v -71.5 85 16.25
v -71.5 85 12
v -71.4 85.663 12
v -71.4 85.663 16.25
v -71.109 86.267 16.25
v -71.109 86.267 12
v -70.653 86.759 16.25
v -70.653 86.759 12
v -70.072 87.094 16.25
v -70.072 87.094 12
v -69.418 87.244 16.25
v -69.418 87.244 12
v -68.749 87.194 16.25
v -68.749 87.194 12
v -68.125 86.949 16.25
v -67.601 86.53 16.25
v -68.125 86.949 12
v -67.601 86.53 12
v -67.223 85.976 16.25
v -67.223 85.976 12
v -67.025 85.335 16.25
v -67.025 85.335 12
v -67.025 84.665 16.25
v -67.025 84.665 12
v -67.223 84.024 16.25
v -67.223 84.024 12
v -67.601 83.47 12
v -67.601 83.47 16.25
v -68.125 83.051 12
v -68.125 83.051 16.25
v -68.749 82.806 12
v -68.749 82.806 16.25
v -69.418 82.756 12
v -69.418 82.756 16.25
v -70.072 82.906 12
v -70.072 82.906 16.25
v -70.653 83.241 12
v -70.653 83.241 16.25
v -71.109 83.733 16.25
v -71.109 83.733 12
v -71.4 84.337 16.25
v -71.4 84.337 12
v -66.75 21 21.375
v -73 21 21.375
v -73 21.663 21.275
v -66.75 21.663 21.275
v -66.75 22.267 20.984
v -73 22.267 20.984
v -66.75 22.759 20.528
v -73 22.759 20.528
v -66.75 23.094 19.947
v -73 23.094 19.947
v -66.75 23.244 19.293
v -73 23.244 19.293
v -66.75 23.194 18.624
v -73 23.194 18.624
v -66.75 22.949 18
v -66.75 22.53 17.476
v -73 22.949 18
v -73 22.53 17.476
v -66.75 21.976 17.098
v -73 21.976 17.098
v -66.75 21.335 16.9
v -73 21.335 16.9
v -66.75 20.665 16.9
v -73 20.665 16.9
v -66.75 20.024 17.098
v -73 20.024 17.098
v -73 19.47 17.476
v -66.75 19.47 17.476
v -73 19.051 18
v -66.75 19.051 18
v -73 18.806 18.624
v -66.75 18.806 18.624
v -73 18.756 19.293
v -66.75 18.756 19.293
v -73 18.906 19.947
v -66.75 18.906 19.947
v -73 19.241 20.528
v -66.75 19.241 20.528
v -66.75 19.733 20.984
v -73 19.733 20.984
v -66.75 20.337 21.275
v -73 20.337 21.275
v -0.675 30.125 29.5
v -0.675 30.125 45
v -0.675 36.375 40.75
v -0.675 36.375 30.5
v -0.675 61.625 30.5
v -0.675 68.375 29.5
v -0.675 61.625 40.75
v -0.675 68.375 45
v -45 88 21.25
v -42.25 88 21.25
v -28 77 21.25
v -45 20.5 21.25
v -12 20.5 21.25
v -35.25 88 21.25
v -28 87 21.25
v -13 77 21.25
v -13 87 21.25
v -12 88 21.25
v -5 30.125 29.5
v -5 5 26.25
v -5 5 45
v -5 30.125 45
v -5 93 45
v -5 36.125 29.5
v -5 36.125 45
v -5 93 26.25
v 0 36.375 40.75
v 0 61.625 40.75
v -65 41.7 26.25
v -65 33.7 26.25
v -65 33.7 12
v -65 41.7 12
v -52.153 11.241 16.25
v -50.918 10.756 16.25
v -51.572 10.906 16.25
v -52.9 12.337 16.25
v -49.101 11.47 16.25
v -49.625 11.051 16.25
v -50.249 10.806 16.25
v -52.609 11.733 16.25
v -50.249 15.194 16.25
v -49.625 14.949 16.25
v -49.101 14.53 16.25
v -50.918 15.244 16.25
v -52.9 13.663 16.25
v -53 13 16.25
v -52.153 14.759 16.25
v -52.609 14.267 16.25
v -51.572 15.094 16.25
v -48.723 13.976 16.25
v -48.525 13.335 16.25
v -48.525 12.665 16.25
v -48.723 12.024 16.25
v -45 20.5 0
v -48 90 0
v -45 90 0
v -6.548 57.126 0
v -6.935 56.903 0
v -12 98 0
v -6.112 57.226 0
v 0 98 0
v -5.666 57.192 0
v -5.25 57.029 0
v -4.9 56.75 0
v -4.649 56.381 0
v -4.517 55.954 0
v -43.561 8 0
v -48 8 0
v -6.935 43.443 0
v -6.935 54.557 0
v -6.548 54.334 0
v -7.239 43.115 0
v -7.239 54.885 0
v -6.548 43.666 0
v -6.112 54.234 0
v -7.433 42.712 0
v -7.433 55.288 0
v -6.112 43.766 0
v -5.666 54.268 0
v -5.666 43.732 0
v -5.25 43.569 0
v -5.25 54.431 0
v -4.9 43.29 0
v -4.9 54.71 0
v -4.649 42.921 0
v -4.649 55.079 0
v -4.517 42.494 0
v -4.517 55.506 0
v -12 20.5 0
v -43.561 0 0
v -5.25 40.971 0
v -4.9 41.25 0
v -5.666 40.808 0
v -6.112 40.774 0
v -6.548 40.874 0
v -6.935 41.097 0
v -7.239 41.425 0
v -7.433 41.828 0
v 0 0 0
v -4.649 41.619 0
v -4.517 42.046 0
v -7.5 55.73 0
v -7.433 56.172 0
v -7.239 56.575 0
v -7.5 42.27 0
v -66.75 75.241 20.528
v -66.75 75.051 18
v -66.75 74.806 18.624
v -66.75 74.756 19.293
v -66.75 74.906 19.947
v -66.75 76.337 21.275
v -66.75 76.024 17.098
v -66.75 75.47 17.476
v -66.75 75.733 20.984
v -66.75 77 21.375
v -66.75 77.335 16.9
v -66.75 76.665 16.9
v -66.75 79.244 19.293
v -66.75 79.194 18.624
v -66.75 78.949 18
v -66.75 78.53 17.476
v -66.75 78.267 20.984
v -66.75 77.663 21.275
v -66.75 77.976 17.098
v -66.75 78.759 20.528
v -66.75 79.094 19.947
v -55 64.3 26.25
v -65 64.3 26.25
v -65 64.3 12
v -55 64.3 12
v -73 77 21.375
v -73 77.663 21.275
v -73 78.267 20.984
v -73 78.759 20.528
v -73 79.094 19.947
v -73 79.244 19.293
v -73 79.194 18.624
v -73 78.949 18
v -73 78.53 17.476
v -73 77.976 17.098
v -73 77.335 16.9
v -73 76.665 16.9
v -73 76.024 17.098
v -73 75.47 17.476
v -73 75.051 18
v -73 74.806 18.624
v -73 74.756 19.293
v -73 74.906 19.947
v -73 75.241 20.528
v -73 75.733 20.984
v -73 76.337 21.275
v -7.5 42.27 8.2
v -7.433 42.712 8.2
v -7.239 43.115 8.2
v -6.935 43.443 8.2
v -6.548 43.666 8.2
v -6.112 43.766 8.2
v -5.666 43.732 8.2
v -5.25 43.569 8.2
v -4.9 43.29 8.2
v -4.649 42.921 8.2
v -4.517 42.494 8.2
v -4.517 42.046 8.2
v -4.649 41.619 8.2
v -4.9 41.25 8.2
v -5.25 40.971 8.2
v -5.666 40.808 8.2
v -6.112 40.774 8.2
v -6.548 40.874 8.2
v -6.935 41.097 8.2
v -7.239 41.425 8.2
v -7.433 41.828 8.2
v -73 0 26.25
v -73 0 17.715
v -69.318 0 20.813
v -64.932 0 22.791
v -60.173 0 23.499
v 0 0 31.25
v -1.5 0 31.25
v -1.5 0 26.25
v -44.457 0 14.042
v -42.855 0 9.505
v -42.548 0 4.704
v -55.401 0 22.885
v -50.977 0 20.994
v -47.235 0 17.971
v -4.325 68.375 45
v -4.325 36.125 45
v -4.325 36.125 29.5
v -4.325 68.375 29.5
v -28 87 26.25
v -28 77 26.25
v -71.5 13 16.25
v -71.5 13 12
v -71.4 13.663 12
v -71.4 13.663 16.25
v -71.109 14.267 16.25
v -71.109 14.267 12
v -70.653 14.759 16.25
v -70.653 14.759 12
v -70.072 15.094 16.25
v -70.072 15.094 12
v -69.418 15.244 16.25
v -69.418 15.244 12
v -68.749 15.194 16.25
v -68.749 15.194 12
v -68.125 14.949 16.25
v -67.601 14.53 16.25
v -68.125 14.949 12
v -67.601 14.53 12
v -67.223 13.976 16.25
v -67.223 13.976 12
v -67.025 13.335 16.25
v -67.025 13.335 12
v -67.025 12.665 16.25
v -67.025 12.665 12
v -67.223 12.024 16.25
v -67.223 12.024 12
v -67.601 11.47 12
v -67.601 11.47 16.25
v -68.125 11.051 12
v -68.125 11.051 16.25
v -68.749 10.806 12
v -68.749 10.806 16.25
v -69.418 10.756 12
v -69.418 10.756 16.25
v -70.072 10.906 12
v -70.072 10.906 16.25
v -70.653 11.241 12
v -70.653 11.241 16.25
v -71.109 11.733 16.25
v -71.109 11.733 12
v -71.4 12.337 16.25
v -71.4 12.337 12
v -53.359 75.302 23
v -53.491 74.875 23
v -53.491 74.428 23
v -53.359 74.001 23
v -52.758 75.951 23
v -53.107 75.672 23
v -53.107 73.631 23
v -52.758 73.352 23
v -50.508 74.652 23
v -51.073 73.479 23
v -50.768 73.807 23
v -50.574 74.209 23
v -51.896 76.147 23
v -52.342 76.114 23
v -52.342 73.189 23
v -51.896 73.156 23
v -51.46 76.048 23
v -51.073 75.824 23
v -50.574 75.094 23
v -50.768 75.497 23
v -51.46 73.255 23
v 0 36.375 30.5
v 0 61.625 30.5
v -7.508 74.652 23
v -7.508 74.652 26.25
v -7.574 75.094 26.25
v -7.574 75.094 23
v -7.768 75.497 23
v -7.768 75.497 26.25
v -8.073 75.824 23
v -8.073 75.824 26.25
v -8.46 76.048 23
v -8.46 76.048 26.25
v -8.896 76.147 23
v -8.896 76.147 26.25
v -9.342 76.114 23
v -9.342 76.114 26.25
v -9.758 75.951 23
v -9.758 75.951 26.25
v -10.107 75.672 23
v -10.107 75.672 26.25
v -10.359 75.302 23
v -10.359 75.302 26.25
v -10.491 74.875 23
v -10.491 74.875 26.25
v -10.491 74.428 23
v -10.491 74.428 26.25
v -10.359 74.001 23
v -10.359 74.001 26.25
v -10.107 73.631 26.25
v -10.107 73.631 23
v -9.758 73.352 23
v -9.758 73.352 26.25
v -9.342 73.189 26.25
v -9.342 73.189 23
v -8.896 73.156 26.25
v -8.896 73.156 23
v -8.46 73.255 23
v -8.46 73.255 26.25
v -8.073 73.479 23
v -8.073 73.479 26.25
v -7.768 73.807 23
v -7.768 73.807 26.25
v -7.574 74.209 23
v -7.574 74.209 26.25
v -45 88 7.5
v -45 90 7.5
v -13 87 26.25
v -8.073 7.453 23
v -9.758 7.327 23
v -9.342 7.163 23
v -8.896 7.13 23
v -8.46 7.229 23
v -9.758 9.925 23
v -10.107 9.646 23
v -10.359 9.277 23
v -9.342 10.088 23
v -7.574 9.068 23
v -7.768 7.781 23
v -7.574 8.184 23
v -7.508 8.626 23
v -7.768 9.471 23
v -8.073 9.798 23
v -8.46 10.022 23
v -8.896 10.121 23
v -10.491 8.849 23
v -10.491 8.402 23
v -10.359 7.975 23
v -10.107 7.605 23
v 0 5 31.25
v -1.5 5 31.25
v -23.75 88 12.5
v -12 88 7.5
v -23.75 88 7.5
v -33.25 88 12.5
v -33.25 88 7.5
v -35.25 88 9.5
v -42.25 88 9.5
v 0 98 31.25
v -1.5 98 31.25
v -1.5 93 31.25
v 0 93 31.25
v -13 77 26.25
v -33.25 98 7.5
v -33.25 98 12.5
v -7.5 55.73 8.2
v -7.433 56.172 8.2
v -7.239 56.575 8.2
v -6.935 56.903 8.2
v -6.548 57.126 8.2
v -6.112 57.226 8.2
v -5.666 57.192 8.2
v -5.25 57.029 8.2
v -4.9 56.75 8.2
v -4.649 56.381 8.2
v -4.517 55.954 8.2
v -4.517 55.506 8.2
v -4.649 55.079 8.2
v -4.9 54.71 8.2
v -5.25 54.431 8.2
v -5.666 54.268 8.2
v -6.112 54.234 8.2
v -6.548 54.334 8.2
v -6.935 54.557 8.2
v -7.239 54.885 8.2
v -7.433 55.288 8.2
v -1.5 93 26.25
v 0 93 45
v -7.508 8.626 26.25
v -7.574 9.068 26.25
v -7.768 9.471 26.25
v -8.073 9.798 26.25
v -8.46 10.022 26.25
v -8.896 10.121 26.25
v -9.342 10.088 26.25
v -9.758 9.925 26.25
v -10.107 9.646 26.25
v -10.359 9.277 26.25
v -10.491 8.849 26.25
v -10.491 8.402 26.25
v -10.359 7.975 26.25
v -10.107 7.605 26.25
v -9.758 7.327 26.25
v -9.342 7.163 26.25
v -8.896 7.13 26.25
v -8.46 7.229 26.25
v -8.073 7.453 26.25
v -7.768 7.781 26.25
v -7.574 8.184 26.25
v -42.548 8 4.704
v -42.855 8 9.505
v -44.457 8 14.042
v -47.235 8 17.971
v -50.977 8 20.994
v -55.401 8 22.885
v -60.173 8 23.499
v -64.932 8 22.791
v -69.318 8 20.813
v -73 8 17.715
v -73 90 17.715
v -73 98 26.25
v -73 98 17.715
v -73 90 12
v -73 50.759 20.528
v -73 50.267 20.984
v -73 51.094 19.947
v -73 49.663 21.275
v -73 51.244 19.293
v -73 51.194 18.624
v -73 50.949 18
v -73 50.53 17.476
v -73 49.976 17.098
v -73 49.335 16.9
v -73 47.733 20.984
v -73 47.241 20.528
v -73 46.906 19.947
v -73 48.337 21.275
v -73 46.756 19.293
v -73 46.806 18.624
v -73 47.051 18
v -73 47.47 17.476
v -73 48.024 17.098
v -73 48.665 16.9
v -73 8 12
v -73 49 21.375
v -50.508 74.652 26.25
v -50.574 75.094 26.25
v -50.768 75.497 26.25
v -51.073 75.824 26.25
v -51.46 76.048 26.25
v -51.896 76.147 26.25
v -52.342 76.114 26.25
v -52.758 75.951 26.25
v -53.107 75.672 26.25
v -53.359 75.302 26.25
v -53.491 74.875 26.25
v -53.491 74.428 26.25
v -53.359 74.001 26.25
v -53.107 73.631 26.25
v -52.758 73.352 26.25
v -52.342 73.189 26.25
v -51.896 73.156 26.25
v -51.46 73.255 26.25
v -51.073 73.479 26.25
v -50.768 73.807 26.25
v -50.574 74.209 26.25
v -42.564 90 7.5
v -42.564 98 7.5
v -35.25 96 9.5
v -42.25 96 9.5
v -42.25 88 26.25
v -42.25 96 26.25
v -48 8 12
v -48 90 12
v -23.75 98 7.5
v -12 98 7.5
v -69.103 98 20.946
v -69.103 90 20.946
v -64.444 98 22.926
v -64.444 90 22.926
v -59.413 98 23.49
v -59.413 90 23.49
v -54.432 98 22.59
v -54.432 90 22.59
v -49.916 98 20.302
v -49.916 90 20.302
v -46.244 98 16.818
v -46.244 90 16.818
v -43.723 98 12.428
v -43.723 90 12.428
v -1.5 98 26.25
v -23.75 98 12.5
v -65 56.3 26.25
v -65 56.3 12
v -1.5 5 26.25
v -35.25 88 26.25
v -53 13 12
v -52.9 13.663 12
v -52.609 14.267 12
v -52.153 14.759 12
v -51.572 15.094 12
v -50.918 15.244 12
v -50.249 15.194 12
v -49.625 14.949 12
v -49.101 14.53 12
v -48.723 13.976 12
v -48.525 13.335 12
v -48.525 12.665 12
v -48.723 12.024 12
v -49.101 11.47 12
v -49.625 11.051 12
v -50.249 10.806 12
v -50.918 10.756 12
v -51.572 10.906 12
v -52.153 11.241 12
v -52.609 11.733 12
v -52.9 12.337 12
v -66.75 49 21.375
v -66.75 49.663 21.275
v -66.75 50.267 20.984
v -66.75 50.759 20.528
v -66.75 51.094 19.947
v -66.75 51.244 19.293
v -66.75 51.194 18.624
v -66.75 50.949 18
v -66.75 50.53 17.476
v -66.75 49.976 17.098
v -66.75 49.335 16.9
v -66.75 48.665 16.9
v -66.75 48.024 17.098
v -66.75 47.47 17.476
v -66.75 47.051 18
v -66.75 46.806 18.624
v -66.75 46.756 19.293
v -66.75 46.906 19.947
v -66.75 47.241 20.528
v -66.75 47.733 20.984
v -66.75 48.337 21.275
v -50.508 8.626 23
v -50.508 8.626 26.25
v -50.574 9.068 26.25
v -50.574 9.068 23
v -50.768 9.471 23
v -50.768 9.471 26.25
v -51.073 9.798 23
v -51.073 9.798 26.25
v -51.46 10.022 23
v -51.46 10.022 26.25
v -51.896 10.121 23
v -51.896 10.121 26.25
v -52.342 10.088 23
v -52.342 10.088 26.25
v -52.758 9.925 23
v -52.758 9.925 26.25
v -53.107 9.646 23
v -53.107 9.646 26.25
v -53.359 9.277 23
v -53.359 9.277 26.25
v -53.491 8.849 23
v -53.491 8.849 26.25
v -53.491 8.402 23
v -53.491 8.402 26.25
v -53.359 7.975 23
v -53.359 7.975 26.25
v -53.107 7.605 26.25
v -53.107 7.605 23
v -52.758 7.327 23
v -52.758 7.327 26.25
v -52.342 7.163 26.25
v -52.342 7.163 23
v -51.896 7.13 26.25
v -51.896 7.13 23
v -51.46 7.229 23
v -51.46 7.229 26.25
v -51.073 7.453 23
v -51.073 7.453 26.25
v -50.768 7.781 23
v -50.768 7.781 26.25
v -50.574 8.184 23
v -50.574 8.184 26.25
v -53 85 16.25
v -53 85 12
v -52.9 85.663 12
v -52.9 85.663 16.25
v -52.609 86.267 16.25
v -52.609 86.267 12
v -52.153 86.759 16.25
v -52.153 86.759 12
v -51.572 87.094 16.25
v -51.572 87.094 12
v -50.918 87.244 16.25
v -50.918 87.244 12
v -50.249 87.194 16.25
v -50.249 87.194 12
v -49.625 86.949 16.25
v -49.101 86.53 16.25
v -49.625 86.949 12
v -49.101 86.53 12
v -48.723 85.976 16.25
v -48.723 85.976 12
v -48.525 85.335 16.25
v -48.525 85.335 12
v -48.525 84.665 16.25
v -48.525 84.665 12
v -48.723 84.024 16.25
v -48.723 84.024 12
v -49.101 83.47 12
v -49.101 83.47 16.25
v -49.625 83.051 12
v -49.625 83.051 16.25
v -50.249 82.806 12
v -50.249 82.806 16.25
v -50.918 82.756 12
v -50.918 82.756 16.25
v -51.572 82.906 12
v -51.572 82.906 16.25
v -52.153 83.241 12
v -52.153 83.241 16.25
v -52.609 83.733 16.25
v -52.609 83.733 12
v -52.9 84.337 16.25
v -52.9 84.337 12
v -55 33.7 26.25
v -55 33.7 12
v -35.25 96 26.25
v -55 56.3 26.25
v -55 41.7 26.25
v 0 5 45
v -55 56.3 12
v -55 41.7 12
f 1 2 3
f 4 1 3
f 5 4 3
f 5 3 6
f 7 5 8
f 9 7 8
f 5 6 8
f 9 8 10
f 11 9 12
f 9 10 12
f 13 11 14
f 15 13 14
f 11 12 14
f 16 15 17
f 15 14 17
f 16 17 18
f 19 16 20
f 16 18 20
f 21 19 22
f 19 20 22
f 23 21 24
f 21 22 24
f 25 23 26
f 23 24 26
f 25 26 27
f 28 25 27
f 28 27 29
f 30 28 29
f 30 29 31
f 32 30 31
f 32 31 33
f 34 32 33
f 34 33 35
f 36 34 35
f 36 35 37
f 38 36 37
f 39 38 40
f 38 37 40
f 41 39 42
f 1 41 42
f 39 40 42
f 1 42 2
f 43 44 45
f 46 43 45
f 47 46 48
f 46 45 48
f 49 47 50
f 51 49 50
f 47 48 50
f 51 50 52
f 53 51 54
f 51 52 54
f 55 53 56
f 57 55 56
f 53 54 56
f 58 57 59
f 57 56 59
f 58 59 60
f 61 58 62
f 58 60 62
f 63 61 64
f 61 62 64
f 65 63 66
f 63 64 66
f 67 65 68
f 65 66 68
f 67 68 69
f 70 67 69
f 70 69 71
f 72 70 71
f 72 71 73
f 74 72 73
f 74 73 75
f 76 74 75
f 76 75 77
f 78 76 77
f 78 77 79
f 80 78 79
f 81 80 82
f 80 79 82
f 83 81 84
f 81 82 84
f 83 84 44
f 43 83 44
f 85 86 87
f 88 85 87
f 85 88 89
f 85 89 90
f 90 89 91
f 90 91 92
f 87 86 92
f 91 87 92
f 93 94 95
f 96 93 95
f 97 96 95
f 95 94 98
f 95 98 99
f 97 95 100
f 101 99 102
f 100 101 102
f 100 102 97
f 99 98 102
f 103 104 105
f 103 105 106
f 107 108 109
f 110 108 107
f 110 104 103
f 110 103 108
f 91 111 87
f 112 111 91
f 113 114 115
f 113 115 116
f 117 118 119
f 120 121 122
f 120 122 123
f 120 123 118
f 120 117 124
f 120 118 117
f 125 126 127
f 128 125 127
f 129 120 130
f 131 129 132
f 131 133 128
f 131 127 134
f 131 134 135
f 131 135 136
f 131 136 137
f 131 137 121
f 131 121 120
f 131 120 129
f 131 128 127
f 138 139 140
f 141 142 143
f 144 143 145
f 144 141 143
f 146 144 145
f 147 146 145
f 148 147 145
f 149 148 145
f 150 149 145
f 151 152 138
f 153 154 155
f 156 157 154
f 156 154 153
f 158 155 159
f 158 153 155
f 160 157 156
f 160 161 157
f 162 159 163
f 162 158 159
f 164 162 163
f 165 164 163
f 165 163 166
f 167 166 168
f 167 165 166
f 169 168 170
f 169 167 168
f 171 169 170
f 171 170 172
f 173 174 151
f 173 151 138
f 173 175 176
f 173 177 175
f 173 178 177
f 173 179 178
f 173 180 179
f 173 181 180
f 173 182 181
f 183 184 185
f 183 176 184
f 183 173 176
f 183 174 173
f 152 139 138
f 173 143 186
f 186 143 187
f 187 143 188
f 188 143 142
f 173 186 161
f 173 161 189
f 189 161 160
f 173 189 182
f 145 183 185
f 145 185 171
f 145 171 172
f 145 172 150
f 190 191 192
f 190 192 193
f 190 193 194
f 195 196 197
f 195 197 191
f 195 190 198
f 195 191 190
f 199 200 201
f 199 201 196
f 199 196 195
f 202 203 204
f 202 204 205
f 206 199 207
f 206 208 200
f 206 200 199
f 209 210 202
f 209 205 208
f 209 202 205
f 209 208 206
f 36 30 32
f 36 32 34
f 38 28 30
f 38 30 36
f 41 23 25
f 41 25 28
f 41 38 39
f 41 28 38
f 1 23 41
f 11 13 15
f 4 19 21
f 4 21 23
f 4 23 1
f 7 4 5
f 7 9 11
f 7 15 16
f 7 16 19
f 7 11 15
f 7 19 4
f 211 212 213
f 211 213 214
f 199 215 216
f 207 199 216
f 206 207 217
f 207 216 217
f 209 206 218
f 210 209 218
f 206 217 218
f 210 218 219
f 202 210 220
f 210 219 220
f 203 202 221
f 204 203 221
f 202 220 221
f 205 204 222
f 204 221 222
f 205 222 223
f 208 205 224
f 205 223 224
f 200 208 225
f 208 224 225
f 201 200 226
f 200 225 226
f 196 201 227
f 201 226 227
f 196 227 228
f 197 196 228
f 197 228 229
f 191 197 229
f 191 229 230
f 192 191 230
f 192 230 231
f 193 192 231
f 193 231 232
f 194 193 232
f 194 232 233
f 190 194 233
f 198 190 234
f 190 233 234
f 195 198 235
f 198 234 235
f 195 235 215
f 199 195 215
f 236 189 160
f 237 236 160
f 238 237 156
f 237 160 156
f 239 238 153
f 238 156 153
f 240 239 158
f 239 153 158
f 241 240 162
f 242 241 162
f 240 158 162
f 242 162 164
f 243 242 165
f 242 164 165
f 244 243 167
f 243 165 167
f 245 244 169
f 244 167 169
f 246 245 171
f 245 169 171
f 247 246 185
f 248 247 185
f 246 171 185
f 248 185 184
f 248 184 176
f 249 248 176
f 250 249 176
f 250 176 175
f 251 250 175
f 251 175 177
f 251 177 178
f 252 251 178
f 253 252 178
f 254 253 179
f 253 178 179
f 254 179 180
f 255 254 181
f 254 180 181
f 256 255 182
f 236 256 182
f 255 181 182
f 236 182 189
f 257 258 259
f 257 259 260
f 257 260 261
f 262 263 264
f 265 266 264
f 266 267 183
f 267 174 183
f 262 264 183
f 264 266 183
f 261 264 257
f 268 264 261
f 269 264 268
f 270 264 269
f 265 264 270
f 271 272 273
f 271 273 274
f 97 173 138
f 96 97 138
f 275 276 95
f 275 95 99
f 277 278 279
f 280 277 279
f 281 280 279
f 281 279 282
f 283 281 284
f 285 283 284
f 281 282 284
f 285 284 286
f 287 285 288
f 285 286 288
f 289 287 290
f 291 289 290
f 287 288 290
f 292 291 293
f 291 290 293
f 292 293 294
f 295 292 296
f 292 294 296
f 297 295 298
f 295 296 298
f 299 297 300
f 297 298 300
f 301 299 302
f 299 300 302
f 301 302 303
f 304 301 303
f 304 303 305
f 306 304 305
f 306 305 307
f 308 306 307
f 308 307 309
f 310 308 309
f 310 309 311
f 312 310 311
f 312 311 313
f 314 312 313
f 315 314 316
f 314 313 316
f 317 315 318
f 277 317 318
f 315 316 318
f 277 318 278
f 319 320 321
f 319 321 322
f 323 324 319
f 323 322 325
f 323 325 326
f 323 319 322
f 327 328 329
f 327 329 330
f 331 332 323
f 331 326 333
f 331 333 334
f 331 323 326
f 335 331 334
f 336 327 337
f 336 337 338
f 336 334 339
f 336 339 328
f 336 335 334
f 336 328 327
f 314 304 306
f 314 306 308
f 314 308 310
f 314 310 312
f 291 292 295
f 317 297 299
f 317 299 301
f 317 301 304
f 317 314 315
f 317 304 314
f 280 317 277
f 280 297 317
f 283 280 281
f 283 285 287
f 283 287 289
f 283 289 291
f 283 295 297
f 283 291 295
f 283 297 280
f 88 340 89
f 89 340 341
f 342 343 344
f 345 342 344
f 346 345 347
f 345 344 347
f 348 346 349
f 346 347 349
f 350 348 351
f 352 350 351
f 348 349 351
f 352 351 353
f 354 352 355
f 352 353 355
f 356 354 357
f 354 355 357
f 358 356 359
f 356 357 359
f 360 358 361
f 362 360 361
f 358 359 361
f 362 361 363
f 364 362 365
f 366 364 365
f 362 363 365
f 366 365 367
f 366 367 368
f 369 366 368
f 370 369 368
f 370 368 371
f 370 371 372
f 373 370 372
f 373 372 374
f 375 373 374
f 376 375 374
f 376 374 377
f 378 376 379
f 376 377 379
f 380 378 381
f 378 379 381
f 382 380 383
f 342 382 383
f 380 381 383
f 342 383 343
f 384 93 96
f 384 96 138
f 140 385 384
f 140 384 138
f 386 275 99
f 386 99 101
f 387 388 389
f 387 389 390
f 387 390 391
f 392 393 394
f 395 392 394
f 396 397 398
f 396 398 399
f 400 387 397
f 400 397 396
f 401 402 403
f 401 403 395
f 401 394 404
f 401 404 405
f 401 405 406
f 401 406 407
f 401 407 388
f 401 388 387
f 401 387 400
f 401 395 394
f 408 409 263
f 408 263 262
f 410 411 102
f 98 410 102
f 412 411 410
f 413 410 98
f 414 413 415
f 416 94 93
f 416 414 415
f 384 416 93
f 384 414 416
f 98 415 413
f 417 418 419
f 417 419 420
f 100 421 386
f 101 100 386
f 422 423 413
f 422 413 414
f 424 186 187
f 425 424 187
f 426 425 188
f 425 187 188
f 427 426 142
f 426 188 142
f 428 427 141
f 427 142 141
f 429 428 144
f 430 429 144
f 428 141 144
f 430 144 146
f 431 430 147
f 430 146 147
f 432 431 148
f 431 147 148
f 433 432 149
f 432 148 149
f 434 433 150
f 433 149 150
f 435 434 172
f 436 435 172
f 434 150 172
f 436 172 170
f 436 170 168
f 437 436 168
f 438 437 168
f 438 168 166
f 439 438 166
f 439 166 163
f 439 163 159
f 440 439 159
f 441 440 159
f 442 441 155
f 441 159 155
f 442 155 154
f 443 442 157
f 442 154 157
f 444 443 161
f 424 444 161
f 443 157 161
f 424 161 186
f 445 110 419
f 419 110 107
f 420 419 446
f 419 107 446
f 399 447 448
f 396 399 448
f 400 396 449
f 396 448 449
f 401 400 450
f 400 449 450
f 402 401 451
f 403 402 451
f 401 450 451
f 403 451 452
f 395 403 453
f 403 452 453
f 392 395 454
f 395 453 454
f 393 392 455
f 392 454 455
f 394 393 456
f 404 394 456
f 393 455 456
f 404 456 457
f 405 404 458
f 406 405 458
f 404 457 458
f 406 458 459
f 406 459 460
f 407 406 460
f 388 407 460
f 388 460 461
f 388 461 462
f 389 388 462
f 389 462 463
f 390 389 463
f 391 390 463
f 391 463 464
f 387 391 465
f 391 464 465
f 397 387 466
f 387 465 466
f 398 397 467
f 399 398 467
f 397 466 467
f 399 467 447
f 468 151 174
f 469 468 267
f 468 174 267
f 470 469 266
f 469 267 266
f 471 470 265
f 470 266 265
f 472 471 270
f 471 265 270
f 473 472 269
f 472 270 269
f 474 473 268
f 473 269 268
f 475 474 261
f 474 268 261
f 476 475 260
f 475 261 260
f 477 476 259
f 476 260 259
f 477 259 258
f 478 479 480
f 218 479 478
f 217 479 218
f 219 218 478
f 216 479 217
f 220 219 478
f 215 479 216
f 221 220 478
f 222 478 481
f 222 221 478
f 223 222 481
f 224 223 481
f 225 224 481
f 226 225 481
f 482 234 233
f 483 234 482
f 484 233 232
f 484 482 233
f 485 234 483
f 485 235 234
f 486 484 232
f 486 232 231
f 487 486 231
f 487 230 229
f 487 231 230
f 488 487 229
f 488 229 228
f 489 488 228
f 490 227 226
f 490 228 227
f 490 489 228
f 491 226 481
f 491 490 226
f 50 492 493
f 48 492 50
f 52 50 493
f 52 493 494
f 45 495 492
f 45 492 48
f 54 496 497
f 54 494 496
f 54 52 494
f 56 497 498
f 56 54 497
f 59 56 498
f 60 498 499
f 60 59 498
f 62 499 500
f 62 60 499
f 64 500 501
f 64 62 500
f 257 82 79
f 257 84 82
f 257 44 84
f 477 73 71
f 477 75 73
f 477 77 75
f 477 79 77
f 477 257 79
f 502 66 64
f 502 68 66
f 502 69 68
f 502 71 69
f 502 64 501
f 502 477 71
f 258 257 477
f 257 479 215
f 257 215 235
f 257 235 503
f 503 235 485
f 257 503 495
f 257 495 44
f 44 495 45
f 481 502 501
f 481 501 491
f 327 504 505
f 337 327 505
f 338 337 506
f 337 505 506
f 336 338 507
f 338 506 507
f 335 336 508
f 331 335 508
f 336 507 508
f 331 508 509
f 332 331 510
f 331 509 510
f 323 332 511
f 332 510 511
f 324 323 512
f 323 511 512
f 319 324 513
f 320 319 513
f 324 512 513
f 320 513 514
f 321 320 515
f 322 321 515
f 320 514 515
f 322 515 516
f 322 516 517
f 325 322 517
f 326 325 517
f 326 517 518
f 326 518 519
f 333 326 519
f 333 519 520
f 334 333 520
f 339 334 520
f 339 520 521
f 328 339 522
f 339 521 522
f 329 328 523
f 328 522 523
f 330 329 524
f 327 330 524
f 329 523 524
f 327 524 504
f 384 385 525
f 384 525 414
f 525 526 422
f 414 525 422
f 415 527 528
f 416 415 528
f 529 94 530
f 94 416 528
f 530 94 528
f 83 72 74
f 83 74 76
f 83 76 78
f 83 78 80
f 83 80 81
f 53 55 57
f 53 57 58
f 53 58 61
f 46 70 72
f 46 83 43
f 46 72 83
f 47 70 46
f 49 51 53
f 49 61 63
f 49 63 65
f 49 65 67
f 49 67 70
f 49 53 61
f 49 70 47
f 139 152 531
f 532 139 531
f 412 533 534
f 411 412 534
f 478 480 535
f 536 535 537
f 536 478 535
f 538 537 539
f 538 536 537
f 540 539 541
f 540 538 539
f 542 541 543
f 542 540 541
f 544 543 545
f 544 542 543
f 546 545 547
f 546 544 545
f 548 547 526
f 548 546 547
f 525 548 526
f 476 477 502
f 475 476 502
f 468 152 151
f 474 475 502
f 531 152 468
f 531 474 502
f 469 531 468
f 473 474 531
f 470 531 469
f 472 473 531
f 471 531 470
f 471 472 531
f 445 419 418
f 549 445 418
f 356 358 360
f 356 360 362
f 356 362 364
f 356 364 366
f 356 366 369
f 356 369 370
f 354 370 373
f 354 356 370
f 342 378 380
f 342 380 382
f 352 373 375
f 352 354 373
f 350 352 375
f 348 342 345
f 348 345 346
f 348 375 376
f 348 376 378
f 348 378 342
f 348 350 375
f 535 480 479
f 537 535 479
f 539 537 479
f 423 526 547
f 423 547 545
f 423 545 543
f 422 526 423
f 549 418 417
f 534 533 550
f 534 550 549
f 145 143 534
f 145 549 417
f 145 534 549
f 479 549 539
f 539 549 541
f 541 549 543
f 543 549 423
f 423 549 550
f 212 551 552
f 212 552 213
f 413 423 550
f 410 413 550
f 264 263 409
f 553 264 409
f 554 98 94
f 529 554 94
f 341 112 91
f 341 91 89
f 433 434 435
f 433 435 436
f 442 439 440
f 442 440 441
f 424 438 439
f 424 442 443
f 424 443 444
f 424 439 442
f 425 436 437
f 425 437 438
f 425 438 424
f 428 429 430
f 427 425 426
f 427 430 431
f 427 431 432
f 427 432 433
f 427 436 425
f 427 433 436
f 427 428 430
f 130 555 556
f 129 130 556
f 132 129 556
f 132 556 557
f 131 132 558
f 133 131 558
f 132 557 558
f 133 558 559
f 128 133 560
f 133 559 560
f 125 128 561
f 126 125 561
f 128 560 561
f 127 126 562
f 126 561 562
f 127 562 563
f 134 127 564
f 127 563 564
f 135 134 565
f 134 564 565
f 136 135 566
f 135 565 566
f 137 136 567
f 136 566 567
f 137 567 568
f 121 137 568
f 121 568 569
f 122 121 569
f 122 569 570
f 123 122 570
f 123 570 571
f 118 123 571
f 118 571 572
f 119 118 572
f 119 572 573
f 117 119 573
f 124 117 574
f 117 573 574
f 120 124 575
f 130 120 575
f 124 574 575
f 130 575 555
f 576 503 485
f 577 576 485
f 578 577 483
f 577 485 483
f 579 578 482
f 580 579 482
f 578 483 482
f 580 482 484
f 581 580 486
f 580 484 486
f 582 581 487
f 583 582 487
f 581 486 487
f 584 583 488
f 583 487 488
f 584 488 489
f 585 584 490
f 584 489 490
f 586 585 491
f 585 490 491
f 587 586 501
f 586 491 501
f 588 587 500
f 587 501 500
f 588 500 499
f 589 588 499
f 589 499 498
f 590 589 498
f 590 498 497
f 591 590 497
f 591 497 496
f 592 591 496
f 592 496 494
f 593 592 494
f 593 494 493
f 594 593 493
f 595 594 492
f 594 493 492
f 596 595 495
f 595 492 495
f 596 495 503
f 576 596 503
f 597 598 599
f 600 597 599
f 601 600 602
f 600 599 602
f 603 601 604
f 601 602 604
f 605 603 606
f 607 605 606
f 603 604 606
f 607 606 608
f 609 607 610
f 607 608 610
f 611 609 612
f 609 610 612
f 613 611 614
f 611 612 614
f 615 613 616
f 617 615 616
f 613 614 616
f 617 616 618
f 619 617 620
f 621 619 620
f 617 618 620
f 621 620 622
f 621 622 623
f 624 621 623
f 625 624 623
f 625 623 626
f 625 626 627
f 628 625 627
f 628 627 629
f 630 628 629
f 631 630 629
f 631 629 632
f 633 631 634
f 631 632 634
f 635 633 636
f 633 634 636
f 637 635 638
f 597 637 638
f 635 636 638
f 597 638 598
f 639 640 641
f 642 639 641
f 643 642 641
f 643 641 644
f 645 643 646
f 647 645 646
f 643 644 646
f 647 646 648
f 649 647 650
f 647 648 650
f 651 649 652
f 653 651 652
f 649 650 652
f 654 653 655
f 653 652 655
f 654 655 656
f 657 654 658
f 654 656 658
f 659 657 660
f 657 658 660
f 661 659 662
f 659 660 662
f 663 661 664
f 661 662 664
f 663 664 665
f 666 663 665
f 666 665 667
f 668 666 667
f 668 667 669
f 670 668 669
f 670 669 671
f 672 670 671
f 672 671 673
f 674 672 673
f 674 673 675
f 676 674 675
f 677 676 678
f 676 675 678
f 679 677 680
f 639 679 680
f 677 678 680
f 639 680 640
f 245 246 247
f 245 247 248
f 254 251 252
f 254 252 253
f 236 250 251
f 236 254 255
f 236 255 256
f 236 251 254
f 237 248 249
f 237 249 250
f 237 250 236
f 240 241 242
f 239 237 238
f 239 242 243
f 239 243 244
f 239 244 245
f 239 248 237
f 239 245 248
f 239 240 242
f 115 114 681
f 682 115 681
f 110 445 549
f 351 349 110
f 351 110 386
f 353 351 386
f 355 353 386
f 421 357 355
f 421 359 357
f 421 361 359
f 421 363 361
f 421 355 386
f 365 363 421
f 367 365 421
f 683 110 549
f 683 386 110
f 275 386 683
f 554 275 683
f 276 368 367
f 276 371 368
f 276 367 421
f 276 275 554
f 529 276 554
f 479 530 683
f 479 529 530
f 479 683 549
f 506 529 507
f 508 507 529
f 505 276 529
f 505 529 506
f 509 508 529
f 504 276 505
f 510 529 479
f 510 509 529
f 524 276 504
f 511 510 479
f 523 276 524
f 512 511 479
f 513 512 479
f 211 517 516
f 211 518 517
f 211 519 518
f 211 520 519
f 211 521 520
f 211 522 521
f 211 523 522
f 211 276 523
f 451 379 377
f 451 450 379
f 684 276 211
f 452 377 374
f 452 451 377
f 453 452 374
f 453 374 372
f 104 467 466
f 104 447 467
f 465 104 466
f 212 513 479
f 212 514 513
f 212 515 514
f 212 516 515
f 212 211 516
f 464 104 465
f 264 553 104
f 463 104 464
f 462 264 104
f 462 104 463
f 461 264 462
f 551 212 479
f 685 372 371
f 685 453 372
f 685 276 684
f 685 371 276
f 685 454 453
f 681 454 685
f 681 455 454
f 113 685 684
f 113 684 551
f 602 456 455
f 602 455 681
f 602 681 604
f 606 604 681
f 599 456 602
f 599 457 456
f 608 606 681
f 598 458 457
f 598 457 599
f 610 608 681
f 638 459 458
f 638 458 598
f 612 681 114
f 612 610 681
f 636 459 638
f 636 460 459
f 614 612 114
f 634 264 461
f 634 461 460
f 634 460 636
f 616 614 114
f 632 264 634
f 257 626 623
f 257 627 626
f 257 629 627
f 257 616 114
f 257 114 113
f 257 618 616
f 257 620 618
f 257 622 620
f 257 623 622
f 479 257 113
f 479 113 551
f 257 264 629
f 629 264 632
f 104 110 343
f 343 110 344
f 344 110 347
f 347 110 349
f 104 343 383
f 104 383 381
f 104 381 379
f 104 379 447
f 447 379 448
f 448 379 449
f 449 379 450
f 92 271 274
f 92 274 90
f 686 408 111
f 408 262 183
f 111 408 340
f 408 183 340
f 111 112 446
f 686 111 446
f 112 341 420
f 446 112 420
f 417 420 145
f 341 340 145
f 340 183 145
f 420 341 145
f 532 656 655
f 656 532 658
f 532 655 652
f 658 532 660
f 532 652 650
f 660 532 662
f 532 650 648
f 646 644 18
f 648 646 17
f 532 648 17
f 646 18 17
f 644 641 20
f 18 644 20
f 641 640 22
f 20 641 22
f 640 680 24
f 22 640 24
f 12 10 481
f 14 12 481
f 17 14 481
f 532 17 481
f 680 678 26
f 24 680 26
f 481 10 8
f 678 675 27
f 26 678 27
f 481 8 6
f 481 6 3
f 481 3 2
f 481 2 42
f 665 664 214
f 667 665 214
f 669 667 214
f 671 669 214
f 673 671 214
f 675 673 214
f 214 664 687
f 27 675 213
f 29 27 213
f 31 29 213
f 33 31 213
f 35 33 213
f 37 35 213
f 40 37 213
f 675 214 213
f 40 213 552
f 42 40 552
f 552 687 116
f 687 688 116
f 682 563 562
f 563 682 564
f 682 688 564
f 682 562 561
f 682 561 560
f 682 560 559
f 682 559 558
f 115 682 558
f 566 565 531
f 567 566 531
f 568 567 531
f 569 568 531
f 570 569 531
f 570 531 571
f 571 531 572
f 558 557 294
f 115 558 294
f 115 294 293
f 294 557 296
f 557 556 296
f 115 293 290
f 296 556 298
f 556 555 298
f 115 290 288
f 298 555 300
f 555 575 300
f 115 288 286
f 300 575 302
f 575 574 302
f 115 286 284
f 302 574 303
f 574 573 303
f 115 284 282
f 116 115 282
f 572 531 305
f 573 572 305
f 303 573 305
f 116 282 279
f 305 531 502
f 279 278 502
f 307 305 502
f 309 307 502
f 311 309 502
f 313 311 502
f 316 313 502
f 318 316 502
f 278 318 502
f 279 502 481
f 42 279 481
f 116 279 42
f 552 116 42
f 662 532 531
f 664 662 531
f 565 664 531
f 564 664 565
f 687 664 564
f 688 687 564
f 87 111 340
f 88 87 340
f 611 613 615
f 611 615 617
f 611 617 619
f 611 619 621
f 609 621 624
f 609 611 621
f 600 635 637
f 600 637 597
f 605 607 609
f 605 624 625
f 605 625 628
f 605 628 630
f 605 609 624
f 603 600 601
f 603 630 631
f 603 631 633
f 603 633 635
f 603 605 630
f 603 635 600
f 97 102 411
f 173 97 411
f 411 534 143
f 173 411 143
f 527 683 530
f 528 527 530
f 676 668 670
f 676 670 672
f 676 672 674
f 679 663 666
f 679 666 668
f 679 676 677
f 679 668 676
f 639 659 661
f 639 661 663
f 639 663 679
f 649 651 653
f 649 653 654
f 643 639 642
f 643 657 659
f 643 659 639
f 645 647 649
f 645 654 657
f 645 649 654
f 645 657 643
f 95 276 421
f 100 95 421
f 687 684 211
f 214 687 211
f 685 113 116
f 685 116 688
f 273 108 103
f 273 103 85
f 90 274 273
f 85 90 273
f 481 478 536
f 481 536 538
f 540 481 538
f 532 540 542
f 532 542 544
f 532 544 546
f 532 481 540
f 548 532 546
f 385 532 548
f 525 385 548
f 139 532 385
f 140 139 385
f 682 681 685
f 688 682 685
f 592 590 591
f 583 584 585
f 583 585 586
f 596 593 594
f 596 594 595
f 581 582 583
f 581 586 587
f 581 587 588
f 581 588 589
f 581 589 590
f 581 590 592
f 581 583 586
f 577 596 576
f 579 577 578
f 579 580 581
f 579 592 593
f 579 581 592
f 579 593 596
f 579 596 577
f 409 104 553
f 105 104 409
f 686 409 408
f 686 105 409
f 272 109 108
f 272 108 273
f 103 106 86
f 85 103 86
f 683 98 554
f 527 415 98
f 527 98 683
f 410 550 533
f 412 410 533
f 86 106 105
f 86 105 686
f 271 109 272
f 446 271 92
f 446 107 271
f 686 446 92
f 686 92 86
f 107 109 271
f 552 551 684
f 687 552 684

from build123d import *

# Parameters (mm, degrees)
SKETCH1_W           = 72
SKETCH1_H           = 26.25
BOSS_EXTRUDE1_DEPTH = 98
SKETCH3_W           = 24
SKETCH3_H           = 12
CUT_EXTRUDE2_DEPTH  = 98
SKETCH4_W           = 1
SKETCH4_H           = 14.25
BOSS_EXTRUDE2_DEPTH = 98
SKETCH8_R           = 17.5
CUT_EXTRUDE6_DEPTH  = 8
CUT_EXTRUDE7_START  = -8
SKETCH9_R           = 17.5
CUT_EXTRUDE7_DEPTH  = 8
SKETCH10_R          = 2.25
CUT_EXTRUDE8_DEPTH  = 4.25
SKETCH11_W          = 33
SKETCH11_H          = 67.5
CUT_EXTRUDE9_DEPTH  = 21.25
SKETCH12_W          = 33
SKETCH12_H          = 7.5
CUT_EXTRUDE10_DEPTH = 21.25
SKETCH13_W          = 9.5
SKETCH13_H          = 10
CUT_EXTRUDE11_DEPTH = 21.25
SKETCH14_W          = 5
SKETCH14_H          = 5
CUT_EXTRUDE13_DEPTH = 101.25
SKETCH17_W          = 7
SKETCH17_H          = 8
CUT_EXTRUDE14_DEPTH = 7
SKETCH18_W          = 5.398243629
SKETCH18_H          = 5.439982626
BOSS_EXTRUDE3_DEPTH = 2
SKETCH19_W          = 15
SKETCH19_H          = 15
CUT_EXTRUDE15_DEPTH = 12
SKETCH20_W          = 15.253773686
SKETCH20_H          = 5.298590198
BOSS_EXTRUDE5_DEPTH = 5
SKETCH22_R          = 1.5
CUT_EXTRUDE16_DEPTH = 8.2
SKETCH23_W          = 10
SKETCH23_H          = 8
CUT_EXTRUDE18_DEPTH = 125.988249448
SKETCH25_R          = 2.25
CUT_EXTRUDE20_DEPTH = 6.25
SKETCH26_W          = 7
SKETCH26_H          = 8
CUT_EXTRUDE21_DEPTH = 124.057913195
SKETCH28_W          = 7.366793482
SKETCH28_H          = 8.135980894
BOSS_EXTRUDE6_DEPTH = 2
SKETCH31_R          = 1.5
CUT_EXTRUDE24_DEPTH = 3.25
SKETCH32_W          = 5
SKETCH32_H          = 98
BOSS_EXTRUDE7_DEPTH = 18.75
SKETCH34_W          = 5
SKETCH34_H          = 5
CUT_EXTRUDE27_DEPTH = 13.75
SKETCH35_W          = 3.5
SKETCH35_H          = 5
CUT_EXTRUDE28_DEPTH = 5
SKETCH37_W          = 10.25
SKETCH37_H          = 25.25
CUT_EXTRUDE29_DEPTH = 3
SKETCH36_W          = 3.65
SKETCH36_H          = 38.25
CUT_EXTRUDE30_DEPTH = 15.5
SKETCH38_W          = 0.68
SKETCH38_H          = 6
CUT_EXTRUDE31_DEPTH = 15.5


with BuildPart() as part:
    # Sketch1 → Boss-Extrude1 (new body)
    with BuildSketch(Plane(origin=(0, 0, 0), x_dir=(1, 0, 0), z_dir=(0, 1, 0))):
        with Locations((-36, -13.125)):
            Rectangle(SKETCH1_W, SKETCH1_H)
    extrude(amount=BOSS_EXTRUDE1_DEPTH)

    # Sketch3 → Cut-Extrude2 (cut)
    with BuildSketch(Plane.XZ):
        with Locations((-60, 6)):
            Rectangle(SKETCH3_W, SKETCH3_H)
    extrude(amount=-CUT_EXTRUDE2_DEPTH, mode=Mode.SUBTRACT)

    # Sketch4 → Boss-Extrude2 (add)
    with BuildSketch(Plane(origin=(0, 0, 0), x_dir=(-1, 0, 0), z_dir=(0, -1, 0))):
        with Locations((72.5, -19.125)):
            Rectangle(SKETCH4_W, SKETCH4_H)
    extrude(amount=-BOSS_EXTRUDE2_DEPTH)

    # Sketch8 → Cut-Extrude6 (cut)
    with BuildSketch(Plane.XZ):
        with Locations((-60, 6)):
            Circle(SKETCH8_R)
    extrude(amount=-CUT_EXTRUDE6_DEPTH, mode=Mode.SUBTRACT)

    # Sketch9 → Cut-Extrude7 (cut)
    with BuildSketch(Plane(origin=(0, 98, 0), x_dir=(1, 0, 0), z_dir=(0, 1, 0)).offset(CUT_EXTRUDE7_START)):
        with Locations((-60, -6)):
            Circle(SKETCH9_R)
    extrude(amount=CUT_EXTRUDE7_DEPTH, mode=Mode.SUBTRACT)

    # Sketch10 → Cut-Extrude8 (cut)
    with BuildSketch(Plane(origin=(0, 0, 12), x_dir=(-1, 0, 0), z_dir=(0, 0, -1))):
        with Locations((69.25, 85)):
            Circle(SKETCH10_R)
        with Locations((50.75, 85)):
            Circle(SKETCH10_R)
        with Locations((69.25, 13)):
            Circle(SKETCH10_R)
        with Locations((50.75, 13)):
            Circle(SKETCH10_R)
    extrude(amount=-CUT_EXTRUDE8_DEPTH, mode=Mode.SUBTRACT)

    # Sketch11 → Cut-Extrude9 (cut)
    with BuildSketch(Plane(origin=(0, 0, 0), x_dir=(-1, 0, 0), z_dir=(0, 0, -1))):
        with Locations((28.5, 54.25)):
            Rectangle(SKETCH11_W, SKETCH11_H)
    extrude(amount=-CUT_EXTRUDE9_DEPTH, mode=Mode.SUBTRACT)

    # Sketch12 → Cut-Extrude10 (cut)
    with BuildSketch(Plane(origin=(0, 98, 0), x_dir=(1, 0, 0), z_dir=(0, 1, 0))):
        with Locations((-28.5, -3.75)):
            Rectangle(SKETCH12_W, SKETCH12_H)
    extrude(amount=-CUT_EXTRUDE10_DEPTH, mode=Mode.SUBTRACT)

    # Sketch13 → Cut-Extrude11 (cut)
    with BuildSketch(Plane(origin=(0, 98, 0), x_dir=(1, 0, 0), z_dir=(0, 1, 0))):
        with Locations((-28.5, -7.5)):
            Rectangle(SKETCH13_W, SKETCH13_H)
    extrude(amount=-CUT_EXTRUDE11_DEPTH, mode=Mode.SUBTRACT)

    # Sketch14 → Cut-Extrude13 (cut)
    with BuildSketch(Plane(origin=(0, 20.5, 0), x_dir=(1, 0, 0), z_dir=(0, 1, 0))):
        with Locations((-39.5, -12)):
            Rectangle(SKETCH14_W, SKETCH14_H)
    extrude(amount=CUT_EXTRUDE13_DEPTH, mode=Mode.SUBTRACT)

    # Sketch17 → Cut-Extrude14 (cut)
    with BuildSketch(Plane(origin=(0, 0, 7.5), x_dir=(-1, 0, 0), z_dir=(0, 0, -1))):
        with Locations((38.75, 92)):
            Rectangle(SKETCH17_W, SKETCH17_H)
    extrude(amount=-CUT_EXTRUDE14_DEPTH, mode=Mode.SUBTRACT)

    # Sketch18 → Boss-Extrude3 (add)
    with BuildSketch(Plane(origin=(0, 98, 0), x_dir=(1, 0, 0), z_dir=(0, 1, 0))):
        with Locations((-39.480706385, -11.994977786)):
            Rectangle(SKETCH18_W, SKETCH18_H)
    extrude(amount=-BOSS_EXTRUDE3_DEPTH)

    # Sketch19 → Cut-Extrude15 (cut)
    with BuildSketch(Plane.XY.offset(26.25)):
        with Locations((-20.5, 79.5)):
            Rectangle(SKETCH19_W, SKETCH19_H)
    extrude(amount=-CUT_EXTRUDE15_DEPTH, mode=Mode.SUBTRACT)

    # Sketch20 → Boss-Extrude5 (add)
    with BuildSketch(Plane.XY.offset(26.25)):
        with Locations((-20.373113157, 74.350704901)):
            Rectangle(SKETCH20_W, SKETCH20_H)
    extrude(amount=-BOSS_EXTRUDE5_DEPTH)

    # Sketch22 → Cut-Extrude16 (cut)
    with BuildSketch(Plane(origin=(0, 0, 0), x_dir=(-1, 0, 0), z_dir=(0, 0, -1))):
        with Locations((6, 55.73)):
            Circle(SKETCH22_R)
        with Locations((6, 42.27)):
            Circle(SKETCH22_R)
    extrude(amount=-CUT_EXTRUDE16_DEPTH, mode=Mode.SUBTRACT)

    # Sketch23 → Cut-Extrude18 (cut, through all)
    with BuildSketch(Plane.XY.offset(26.25)):
        with Locations((-60, 37.7)):
            Rectangle(SKETCH23_W, SKETCH23_H)
        with Locations((-60, 60.3)):
            Rectangle(SKETCH23_W, SKETCH23_H)
    extrude(amount=-CUT_EXTRUDE18_DEPTH, mode=Mode.SUBTRACT)

    # Sketch25 → Cut-Extrude20 (cut)
    with BuildSketch(Plane.ZY.offset(73)):
        with Locations((19.125, 77)):
            Circle(SKETCH25_R)
        with Locations((19.125, 49)):
            Circle(SKETCH25_R)
        with Locations((19.125, 21)):
            Circle(SKETCH25_R)
    extrude(amount=-CUT_EXTRUDE20_DEPTH, mode=Mode.SUBTRACT)

    # Sketch26 → Cut-Extrude21 (cut, through all)
    with BuildSketch(Plane(origin=(0, 0, 14.5), x_dir=(-1, 0, 0), z_dir=(0, 0, -1))):
        with Locations((38.75, 92)):
            Rectangle(SKETCH26_W, SKETCH26_H)
    extrude(amount=-CUT_EXTRUDE21_DEPTH, mode=Mode.SUBTRACT)

    # Sketch28 → Boss-Extrude6 (add)
    with BuildSketch(Plane(origin=(0, 0, 7.5), x_dir=(-1, 0, 0), z_dir=(0, 0, -1))):
        with Locations((38.749742444, 92.067990447)):
            Rectangle(SKETCH28_W, SKETCH28_H)
    extrude(amount=-BOSS_EXTRUDE6_DEPTH)

    # Sketch31 → Cut-Extrude24 (cut)
    with BuildSketch(Plane.XY.offset(26.25)):
        with Locations((-52.007752906, 74.651528785)):
            Circle(SKETCH31_R)
        with Locations((-9.007752906, 74.651528785)):
            Circle(SKETCH31_R)
        with Locations((-9.007752906, 8.625682812)):
            Circle(SKETCH31_R)
        with Locations((-52.007752906, 8.625682812)):
            Circle(SKETCH31_R)
    extrude(amount=-CUT_EXTRUDE24_DEPTH, mode=Mode.SUBTRACT)

    # Sketch32 → Boss-Extrude7 (add)
    with BuildSketch(Plane.XY.offset(26.25)):
        with Locations((-2.5, 49)):
            Rectangle(SKETCH32_W, SKETCH32_H)
    extrude(amount=BOSS_EXTRUDE7_DEPTH)

    # Sketch34 → Cut-Extrude27 (cut)
    with BuildSketch(Plane.XY.offset(45)):
        with Locations((-2.5, 95.5)):
            Rectangle(SKETCH34_W, SKETCH34_H)
        with Locations((-2.5, 2.5)):
            Rectangle(SKETCH34_W, SKETCH34_H)
    extrude(amount=-CUT_EXTRUDE27_DEPTH, mode=Mode.SUBTRACT)

    # Sketch35 → Cut-Extrude28 (cut)
    with BuildSketch(Plane.XY.offset(31.25)):
        with Locations((-3.25, 95.5)):
            Rectangle(SKETCH35_W, SKETCH35_H)
        with Locations((-3.25, 2.5)):
            Rectangle(SKETCH35_W, SKETCH35_H)
    extrude(amount=-CUT_EXTRUDE28_DEPTH, mode=Mode.SUBTRACT)

    # Sketch37 → Cut-Extrude29 (cut)
    with BuildSketch(Plane(origin=(0, 0, 0), x_dir=(0, 0, -1), z_dir=(1, 0, 0))):
        with Locations((-35.625, 49)):
            Rectangle(SKETCH37_W, SKETCH37_H)
    extrude(amount=-CUT_EXTRUDE29_DEPTH, mode=Mode.SUBTRACT)

    # Sketch36 → Cut-Extrude30 (cut)
    with BuildSketch(Plane.XY.offset(45)):
        with Locations((-2.5, 49.25)):
            Rectangle(SKETCH36_W, SKETCH36_H)
    extrude(amount=-CUT_EXTRUDE30_DEPTH, mode=Mode.SUBTRACT)

    # Sketch38 → Cut-Extrude31 (cut)
    with BuildSketch(Plane.XY.offset(45)):
        with Locations((-4.665, 33.125)):
            Rectangle(SKETCH38_W, SKETCH38_H)
    extrude(amount=-CUT_EXTRUDE31_DEPTH, mode=Mode.SUBTRACT)


solid = part.part
